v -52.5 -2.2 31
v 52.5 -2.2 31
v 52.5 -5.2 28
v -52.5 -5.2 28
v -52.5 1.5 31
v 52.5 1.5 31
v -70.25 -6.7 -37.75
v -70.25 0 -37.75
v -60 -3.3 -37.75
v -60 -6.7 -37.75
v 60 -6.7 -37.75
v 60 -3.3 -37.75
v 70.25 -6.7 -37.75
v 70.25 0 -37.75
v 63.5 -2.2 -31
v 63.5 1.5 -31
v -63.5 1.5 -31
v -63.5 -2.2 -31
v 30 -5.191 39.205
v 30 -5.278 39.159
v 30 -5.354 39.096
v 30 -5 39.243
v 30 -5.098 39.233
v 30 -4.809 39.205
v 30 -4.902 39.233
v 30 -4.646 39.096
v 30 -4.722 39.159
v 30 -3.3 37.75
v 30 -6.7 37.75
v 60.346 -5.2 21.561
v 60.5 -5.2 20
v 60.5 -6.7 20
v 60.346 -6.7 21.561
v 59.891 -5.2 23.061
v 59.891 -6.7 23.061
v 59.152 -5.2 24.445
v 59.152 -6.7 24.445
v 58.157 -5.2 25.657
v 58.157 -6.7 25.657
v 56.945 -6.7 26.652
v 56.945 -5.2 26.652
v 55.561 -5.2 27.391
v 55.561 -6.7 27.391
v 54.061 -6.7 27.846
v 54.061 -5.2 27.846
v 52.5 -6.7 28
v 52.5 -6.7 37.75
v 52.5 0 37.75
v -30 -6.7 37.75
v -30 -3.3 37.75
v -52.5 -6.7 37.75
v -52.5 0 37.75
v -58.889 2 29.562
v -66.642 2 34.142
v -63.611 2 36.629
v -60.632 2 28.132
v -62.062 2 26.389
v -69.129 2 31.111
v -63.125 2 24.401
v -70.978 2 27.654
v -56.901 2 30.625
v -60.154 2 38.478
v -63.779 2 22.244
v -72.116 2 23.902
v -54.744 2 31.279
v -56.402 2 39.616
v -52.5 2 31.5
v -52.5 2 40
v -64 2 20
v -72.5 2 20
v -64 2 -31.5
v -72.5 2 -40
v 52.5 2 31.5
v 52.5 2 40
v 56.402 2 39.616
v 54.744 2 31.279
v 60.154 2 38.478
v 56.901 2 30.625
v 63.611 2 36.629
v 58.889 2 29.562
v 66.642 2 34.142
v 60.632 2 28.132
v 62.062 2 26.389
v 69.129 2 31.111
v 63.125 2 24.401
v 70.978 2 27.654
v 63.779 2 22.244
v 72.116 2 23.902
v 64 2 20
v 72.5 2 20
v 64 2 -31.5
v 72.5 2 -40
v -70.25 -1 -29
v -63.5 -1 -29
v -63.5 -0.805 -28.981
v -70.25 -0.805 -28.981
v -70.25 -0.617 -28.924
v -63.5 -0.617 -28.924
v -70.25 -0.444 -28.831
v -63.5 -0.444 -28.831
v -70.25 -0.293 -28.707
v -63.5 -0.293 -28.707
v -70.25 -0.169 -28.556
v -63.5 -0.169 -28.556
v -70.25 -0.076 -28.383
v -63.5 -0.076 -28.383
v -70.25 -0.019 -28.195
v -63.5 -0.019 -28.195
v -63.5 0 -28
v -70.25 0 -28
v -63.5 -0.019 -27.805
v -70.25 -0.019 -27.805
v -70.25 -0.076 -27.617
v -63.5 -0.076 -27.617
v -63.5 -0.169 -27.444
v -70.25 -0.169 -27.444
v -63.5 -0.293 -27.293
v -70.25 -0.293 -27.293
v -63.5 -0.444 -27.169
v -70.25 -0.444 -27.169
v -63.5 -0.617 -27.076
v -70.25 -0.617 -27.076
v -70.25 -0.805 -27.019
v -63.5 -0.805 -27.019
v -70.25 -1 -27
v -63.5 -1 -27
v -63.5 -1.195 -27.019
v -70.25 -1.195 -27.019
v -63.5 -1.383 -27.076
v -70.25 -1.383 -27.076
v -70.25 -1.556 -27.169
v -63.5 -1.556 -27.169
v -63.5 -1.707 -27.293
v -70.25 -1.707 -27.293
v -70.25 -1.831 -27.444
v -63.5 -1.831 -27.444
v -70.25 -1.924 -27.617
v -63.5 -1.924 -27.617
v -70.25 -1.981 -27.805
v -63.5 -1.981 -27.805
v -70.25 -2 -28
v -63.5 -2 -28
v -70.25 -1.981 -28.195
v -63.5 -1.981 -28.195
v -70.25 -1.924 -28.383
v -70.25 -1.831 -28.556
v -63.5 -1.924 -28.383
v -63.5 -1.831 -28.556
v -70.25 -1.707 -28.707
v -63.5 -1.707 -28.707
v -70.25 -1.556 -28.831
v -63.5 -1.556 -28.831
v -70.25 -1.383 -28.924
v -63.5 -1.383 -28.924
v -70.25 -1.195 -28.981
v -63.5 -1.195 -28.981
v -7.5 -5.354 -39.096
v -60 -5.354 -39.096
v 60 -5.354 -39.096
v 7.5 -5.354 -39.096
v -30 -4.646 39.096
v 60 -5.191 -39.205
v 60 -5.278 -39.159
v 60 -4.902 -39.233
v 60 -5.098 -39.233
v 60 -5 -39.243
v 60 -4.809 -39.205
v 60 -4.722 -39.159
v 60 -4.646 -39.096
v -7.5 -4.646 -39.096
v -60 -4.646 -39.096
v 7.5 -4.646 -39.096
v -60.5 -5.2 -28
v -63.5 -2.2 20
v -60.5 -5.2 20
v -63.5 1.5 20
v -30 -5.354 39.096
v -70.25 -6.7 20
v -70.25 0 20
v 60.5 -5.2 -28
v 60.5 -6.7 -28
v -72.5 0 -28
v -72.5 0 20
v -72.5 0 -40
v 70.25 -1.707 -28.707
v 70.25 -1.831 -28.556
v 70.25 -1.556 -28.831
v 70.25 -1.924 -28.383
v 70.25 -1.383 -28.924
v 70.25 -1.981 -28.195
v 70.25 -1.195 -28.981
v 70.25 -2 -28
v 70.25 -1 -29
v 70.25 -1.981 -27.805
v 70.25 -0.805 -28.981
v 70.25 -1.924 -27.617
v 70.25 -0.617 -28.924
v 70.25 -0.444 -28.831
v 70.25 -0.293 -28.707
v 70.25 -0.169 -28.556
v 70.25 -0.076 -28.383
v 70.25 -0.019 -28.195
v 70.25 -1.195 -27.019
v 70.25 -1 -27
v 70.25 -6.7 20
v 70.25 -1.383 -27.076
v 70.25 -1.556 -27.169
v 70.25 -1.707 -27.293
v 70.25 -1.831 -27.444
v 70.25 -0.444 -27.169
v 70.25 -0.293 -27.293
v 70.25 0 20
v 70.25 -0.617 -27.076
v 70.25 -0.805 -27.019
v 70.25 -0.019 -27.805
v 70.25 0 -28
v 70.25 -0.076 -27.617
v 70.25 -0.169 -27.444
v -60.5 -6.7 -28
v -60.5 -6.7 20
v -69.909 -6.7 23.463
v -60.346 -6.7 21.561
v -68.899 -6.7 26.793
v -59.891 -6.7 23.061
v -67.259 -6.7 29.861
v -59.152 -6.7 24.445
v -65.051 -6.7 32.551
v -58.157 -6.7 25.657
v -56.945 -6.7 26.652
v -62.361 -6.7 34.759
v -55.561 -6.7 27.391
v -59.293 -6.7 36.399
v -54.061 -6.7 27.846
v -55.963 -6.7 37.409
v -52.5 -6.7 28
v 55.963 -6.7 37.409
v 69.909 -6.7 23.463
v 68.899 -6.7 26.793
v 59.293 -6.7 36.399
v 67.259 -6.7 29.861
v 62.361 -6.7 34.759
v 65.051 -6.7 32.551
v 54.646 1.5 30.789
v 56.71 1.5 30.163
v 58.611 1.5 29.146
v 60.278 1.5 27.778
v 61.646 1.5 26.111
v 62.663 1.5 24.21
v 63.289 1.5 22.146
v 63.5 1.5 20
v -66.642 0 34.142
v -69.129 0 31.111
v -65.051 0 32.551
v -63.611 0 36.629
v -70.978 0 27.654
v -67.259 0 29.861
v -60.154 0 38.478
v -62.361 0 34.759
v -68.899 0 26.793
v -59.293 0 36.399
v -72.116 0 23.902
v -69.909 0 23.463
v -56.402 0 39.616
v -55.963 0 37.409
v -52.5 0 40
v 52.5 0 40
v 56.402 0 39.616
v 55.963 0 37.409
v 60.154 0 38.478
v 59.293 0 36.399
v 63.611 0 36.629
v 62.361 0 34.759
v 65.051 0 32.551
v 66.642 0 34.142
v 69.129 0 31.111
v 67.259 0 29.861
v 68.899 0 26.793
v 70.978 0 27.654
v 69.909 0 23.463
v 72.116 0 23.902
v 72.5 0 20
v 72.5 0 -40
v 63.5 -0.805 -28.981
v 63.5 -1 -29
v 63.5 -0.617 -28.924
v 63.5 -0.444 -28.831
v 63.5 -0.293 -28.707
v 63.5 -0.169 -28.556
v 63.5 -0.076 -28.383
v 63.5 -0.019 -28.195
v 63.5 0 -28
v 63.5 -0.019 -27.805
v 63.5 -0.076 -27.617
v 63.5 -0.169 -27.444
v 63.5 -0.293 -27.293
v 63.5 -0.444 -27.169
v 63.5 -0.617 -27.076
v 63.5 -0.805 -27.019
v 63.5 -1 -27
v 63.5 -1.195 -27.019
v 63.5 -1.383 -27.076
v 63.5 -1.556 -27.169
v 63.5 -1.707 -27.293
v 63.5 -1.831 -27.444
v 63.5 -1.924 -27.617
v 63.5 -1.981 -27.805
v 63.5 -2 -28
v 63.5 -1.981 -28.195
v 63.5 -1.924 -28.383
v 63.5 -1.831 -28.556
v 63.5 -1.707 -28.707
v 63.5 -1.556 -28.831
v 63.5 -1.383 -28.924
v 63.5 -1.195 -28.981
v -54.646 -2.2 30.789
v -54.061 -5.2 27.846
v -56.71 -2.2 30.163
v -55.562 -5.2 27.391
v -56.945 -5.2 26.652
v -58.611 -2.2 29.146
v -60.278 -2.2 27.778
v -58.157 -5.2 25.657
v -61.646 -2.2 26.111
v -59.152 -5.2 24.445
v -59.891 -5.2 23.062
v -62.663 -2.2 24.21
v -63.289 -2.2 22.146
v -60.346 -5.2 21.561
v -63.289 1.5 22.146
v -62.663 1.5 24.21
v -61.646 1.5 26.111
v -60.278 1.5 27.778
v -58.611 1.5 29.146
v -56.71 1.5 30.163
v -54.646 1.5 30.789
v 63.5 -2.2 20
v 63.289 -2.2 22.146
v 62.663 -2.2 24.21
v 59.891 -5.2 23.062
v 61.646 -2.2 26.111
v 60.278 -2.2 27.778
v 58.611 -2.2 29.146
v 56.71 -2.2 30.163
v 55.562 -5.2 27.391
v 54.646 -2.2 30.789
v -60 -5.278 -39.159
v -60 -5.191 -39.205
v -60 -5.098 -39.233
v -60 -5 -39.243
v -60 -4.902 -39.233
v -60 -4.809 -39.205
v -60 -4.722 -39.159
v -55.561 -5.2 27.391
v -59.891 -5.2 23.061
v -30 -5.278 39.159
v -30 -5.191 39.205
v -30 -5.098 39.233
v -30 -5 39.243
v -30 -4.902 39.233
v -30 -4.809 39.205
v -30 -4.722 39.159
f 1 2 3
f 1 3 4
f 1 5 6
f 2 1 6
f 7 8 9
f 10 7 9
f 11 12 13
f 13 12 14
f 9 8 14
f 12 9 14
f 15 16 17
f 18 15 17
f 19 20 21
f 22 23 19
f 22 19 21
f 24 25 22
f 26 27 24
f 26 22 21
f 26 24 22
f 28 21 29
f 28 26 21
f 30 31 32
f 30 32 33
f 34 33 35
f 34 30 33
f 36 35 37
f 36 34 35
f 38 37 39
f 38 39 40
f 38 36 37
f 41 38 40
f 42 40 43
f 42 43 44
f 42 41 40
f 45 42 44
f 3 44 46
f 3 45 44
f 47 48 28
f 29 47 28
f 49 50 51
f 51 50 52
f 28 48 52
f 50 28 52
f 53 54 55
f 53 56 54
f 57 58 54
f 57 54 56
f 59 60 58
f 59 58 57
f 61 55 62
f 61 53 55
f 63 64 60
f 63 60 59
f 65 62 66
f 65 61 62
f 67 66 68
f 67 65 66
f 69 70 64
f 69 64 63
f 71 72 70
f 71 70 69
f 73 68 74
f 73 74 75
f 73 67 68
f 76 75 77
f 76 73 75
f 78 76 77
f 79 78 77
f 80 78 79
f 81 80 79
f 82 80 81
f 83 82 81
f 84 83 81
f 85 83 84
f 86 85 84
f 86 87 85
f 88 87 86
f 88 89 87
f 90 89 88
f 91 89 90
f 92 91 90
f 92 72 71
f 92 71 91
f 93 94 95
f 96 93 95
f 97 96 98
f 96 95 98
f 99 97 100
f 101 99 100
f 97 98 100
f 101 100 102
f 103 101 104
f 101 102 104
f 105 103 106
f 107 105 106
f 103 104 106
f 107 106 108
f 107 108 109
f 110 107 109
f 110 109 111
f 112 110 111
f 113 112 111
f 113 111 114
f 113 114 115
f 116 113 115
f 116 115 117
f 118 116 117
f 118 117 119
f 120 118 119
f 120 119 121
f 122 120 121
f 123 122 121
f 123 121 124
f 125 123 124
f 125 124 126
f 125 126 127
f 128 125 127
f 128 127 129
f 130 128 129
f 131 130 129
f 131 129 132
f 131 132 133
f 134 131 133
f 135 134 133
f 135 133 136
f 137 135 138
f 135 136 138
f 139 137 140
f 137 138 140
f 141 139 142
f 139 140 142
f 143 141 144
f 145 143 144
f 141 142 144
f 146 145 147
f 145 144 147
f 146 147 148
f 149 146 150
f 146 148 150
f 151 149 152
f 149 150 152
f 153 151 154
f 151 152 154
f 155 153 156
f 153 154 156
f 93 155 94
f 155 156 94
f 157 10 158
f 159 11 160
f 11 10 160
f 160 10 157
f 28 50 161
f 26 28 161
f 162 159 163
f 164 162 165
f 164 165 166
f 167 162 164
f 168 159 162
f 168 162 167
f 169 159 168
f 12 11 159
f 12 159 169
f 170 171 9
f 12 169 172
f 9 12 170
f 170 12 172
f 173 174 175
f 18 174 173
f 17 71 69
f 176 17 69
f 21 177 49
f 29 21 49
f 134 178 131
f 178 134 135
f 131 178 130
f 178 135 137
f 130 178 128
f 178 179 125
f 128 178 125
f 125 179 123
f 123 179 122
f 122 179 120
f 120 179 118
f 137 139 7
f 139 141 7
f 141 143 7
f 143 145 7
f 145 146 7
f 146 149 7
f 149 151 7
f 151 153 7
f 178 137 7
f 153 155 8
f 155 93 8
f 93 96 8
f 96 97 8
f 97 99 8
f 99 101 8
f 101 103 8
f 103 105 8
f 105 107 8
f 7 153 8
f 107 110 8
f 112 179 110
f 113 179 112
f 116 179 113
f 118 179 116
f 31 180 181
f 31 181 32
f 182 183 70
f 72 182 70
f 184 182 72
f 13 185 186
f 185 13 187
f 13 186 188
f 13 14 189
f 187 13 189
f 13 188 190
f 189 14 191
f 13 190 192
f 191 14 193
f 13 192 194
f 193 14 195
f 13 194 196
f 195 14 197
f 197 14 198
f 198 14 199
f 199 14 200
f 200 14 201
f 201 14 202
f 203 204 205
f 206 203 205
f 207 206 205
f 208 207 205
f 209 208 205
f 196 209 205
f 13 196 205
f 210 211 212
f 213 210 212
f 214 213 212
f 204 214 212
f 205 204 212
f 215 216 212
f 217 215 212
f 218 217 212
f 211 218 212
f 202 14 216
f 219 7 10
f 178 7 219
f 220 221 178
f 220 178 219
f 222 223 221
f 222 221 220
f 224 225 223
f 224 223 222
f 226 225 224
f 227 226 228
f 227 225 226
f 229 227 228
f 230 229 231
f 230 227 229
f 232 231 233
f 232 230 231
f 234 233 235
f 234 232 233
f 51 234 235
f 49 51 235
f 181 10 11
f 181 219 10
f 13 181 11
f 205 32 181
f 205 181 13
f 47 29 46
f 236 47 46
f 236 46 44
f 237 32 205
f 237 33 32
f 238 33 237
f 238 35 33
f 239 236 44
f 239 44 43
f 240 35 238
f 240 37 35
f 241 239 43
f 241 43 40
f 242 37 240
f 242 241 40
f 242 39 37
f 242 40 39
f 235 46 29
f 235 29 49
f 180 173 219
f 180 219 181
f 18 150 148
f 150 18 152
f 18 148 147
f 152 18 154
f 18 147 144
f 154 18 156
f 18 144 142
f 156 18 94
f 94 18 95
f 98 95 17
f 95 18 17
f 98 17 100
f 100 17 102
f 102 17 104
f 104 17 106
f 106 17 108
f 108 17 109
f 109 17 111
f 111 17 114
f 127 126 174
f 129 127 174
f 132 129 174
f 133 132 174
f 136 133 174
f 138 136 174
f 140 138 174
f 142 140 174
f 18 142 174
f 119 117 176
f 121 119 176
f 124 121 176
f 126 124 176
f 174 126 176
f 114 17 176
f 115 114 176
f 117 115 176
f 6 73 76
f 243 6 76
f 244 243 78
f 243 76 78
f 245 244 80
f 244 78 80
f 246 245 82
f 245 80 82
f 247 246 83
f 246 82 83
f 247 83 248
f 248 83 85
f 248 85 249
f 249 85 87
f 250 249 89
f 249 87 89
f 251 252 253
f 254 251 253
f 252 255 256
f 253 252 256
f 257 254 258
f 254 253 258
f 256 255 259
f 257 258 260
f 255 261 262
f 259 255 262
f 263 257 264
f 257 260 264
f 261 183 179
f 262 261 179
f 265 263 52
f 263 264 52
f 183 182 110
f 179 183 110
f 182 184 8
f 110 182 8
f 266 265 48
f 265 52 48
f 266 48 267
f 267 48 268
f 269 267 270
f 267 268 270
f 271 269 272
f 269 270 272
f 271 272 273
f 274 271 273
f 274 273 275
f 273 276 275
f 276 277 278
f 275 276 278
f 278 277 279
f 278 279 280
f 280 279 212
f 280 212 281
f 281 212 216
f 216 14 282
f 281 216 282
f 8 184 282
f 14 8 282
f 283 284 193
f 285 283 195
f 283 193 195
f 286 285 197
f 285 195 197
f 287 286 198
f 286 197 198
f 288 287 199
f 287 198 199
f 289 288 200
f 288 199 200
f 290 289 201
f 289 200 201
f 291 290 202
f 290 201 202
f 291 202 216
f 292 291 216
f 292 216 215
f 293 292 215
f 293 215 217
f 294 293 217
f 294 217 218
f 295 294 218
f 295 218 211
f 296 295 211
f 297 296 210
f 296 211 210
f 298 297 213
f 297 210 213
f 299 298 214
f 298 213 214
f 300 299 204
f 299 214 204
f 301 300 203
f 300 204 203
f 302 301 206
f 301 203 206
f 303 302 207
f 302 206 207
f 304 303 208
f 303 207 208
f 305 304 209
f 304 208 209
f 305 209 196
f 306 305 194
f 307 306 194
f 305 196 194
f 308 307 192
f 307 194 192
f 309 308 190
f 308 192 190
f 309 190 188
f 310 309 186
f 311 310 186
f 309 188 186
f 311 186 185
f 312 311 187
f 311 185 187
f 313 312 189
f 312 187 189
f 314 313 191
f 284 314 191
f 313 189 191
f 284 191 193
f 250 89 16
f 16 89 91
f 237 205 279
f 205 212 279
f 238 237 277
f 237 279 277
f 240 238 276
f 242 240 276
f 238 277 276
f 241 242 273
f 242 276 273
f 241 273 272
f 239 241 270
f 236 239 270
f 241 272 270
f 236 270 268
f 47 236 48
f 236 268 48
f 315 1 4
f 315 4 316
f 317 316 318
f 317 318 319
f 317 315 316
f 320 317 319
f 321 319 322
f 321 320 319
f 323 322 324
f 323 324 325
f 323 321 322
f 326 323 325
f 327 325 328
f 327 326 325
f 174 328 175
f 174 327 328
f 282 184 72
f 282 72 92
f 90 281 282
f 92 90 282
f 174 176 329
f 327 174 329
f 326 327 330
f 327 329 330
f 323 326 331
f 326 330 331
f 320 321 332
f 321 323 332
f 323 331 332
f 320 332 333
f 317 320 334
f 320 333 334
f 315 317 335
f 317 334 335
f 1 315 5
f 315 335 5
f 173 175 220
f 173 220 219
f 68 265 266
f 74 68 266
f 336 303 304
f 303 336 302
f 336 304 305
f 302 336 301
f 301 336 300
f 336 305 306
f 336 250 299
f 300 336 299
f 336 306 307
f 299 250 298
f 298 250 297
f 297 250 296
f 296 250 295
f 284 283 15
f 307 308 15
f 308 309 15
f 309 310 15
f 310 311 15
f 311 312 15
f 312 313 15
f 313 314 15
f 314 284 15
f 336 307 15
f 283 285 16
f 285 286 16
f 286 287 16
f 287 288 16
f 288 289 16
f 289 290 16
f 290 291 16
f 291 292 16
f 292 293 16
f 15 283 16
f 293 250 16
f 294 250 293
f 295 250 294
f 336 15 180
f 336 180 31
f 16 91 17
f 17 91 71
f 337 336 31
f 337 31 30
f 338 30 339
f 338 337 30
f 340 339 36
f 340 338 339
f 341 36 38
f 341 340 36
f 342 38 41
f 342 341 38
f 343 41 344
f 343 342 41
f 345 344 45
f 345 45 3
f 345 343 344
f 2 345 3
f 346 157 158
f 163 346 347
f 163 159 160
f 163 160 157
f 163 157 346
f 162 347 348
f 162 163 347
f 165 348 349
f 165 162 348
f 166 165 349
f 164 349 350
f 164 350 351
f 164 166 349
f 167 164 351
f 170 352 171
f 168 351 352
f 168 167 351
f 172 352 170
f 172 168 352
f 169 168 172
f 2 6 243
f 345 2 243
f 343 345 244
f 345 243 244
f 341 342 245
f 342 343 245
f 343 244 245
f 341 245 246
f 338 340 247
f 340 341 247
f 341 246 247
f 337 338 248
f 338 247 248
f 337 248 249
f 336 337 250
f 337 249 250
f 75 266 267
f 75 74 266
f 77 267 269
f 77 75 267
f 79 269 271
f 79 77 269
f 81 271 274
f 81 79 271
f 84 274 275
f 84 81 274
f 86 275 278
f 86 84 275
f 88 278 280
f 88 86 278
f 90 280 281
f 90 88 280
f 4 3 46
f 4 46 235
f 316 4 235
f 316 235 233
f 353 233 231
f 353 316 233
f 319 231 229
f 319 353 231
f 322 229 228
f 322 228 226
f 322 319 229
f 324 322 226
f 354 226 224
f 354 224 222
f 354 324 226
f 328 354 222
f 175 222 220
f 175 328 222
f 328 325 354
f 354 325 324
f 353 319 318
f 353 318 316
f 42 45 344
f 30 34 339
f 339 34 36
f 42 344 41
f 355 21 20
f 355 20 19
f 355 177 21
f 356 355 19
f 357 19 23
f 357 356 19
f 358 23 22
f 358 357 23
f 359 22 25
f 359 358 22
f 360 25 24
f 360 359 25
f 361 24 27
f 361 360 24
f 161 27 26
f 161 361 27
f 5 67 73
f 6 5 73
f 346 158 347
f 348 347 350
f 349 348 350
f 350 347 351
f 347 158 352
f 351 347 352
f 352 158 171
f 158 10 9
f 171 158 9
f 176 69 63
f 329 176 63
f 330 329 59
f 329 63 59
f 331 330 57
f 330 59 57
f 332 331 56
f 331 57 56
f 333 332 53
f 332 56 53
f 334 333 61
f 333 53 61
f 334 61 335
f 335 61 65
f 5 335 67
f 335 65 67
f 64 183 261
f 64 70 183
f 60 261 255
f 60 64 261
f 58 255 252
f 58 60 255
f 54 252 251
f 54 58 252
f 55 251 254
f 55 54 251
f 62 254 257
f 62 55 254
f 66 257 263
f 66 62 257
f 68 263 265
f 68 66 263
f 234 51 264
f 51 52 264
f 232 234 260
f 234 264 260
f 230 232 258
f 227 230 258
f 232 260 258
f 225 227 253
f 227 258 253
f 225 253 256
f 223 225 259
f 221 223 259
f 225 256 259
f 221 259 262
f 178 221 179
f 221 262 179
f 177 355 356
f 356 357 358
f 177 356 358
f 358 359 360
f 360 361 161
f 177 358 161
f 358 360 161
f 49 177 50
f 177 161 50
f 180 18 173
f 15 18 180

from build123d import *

# Parameters (mm, degrees)
SKETCH_1_W          = 145
SKETCH_1_H          = 80
EXTRUDE_1_DEPTH     = 2
FILLET_1_R          = 20
CUT_EXTRUDE_1_DEPTH = 2
EXTRUDE_2_DEPTH     = 2
EXTRUDE_4_DEPTH     = 7.5
EXTRUDE_5_DEPTH     = 30
FILLET_2_R          = 0.5
EXTRUDE_6_DEPTH     = 4.7
EXTRUDE_START       = -1.5
EXTRUDE_9_DEPTH     = 1.5
CHAMFER_2_SIZE      = 3
SKETCH_11_R         = 1
CUT_EXTRUDE_2_DEPTH = 149.399637803
CHAMFER_3_SIZE      = 0.5
EXTRUDE_10_DEPTH    = 60


with BuildPart() as part:
    # Эскиз1 → Бобышка-Вытянуть1 (new body)
    with BuildSketch(Plane(origin=(0, 0, 0), x_dir=(1, 0, 0), z_dir=(0, 1, 0))):
        Rectangle(SKETCH_1_W, SKETCH_1_H)
    extrude(amount=EXTRUDE_1_DEPTH)

    # Скругление1
    fillet_1_edges = [part.edges().sort_by_distance(p)[0] for p in [
        (72.5, 1, 40),
        (-72.5, 1, 40),
    ]]
    fillet(fillet_1_edges, radius=FILLET_1_R)

    # Эскиз2 → Вырез-Вытянуть1 (cut)
    with BuildSketch(Plane(origin=(0, 2, 0), x_dir=(1, 0, 0), z_dir=(0, 1, 0))):
        with BuildLine():
            Line((-63.5, 31), (-63.5, -20))
            ThreePointArc((-63.5, -20), (-60.278174593, -27.778174593), (-52.5, -31))
            Line((-52.5, -31), (52.5, -31))
            ThreePointArc((52.5, -31), (60.278174593, -27.778174593), (63.5, -20))
            Line((63.5, -20), (63.5, 31))
            Line((63.5, 31), (-63.5, 31))
        make_face()
    extrude(amount=-CUT_EXTRUDE_1_DEPTH, mode=Mode.SUBTRACT)

    # Эскиз3 → Бобышка-Вытянуть2 (add)
    with BuildSketch(Plane.XZ):
        with BuildLine():
            Line((70.25, -37.75), (70.25, 20))
            ThreePointArc((70.25, 20), (65.051145366, 32.551145366), (52.5, 37.75))
            Line((52.5, 37.75), (-52.5, 37.75))
            ThreePointArc((-52.5, 37.75), (-65.051145366, 32.551145366), (-70.25, 20))
            Line((-70.25, 20), (-70.25, -37.75))
            Line((-70.25, -37.75), (70.25, -37.75))
        make_face()
        with BuildLine():
            Line((-63.5, -31), (-63.5, 20))
            ThreePointArc((-63.5, 20), (-60.278174593, 27.778174593), (-52.5, 31))
            Line((-52.5, 31), (52.5, 31))
            ThreePointArc((52.5, 31), (60.278174593, 27.778174593), (63.5, 20))
            Line((63.5, 20), (63.5, -31))
            Line((63.5, -31), (-63.5, -31))
        make_face(mode=Mode.SUBTRACT)
    extrude(amount=EXTRUDE_2_DEPTH)

    # Эскиз5 → Бобышка-Вытянуть4 (add, symmetric)
    with BuildSketch(Plane(origin=(0, 0, 0), x_dir=(0, 0, -1), z_dir=(1, 0, 0))):
        Polygon((37.75, -2), (31, -2), (31, -6.7), (37.75, -6.7), (39.45, -5), (37.75, -3.3), align=None)
        Polygon((-31, -2), (-31, -6.7), (-37.75, -6.7), (-39.45, -5), (-37.75, -3.3), (-37.75, -2), align=None)
    extrude(amount=EXTRUDE_4_DEPTH, both=True)

    # Эскиз6 → Бобышка-Вытянуть5 (add, symmetric)
    with BuildSketch(Plane(origin=(0, 0, 0), x_dir=(0, 0, -1), z_dir=(1, 0, 0))):
        Polygon((-39.45, -5), (-37.75, -6.7), (-31, -6.7), (-31, -2), (-37.75, -2), (-37.75, -3.3), align=None)
    extrude(amount=EXTRUDE_5_DEPTH, both=True)

    # Скругление2
    fillet_2_edges = [part.edges().sort_by_distance(p)[0] for p in [
        (0, -5, 39.45),
        (0, -5, -39.45),
    ]]
    fillet(fillet_2_edges, radius=FILLET_2_R)

    # Эскиз7 → Бобышка-Вытянуть6 (add)
    with BuildSketch(Plane.XZ.offset(2)):
        with BuildLine():
            Line((-52.5, 31), (-30, 31))
            Line((-30, 31), (-30, 37.75))
            Line((-30, 37.75), (-52.5, 37.75))
            ThreePointArc((-52.5, 37.75), (-65.051145366, 32.551145366), (-70.25, 20))
            Line((-70.25, 20), (-70.25, -37.75))
            Line((-70.25, -37.75), (-7.5, -37.75))
            Line((-7.5, -37.75), (-7.5, -31))
            Line((-7.5, -31), (-63.5, -31))
            Line((-63.5, -31), (-63.5, 20))
            ThreePointArc((-63.5, 20), (-60.278174593, 27.778174593), (-52.5, 31))
        make_face()
        with BuildLine():
            Line((30, 31), (52.5, 31))
            ThreePointArc((52.5, 31), (60.278174593, 27.778174593), (63.5, 20))
            Line((63.5, 20), (63.5, -31))
            Line((63.5, -31), (7.5, -31))
            Line((7.5, -31), (7.5, -37.75))
            Line((7.5, -37.75), (70.25, -37.75))
            Line((70.25, -37.75), (70.25, 20))
            ThreePointArc((70.25, 20), (65.051145366, 32.551145366), (52.5, 37.75))
            Line((52.5, 37.75), (30, 37.75))
            Line((30, 37.75), (30, 31))
        make_face()
    extrude(amount=EXTRUDE_6_DEPTH)

    # Эскиз10 → Бобышка-Вытянуть9 (add)
    with BuildSketch(Plane.XZ.offset(6.7).offset(EXTRUDE_START)):
        with BuildLine():
            Line((-63.5, 20), (-63.5, -31))
            Line((-63.5, -31), (63.5, -31))
            Line((63.5, -31), (63.5, 20))
            ThreePointArc((63.5, 20), (60.278174593, 27.778174593), (52.5, 31))
            Line((52.5, 31), (-52.5, 31))
            ThreePointArc((-52.5, 31), (-60.278174593, 27.778174593), (-63.5, 20))
        make_face()
        with BuildLine():
            Line((60.5, -28), (60.5, 20))
            ThreePointArc((60.5, 20), (58.156854249, 25.656854249), (52.5, 28))
            Line((52.5, 28), (-52.5, 28))
            ThreePointArc((-52.5, 28), (-58.156854249, 25.656854249), (-60.5, 20))
            Line((-60.5, 20), (-60.5, -28))
            Line((-60.5, -28), (60.5, -28))
        make_face(mode=Mode.SUBTRACT)
    extrude(amount=EXTRUDE_9_DEPTH)

    # Фаска2
    chamfer_2_edges = [part.edges().sort_by_distance(p)[0] for p in [
        (-60.278174593, -5.2, 27.778174593),
        (0, -5.2, 31),
        (60.278174593, -5.2, 27.778174593),
        (63.5, -5.2, -5.5),
        (0, -5.2, -31),
        (-63.5, -5.2, -5.5),
    ]]
    chamfer(chamfer_2_edges, length=CHAMFER_2_SIZE - 0.0001)  # a hair under: the kernel refuses the full size

    # Эскиз11 → Вырез-Вытянуть2 (cut, through all)
    with BuildSketch(Plane(origin=(70.25, 0, 0), x_dir=(0, 0, -1), z_dir=(1, 0, 0))):
        with Locations((28, -1)):
            Circle(SKETCH_11_R)
    extrude(amount=-CUT_EXTRUDE_2_DEPTH, mode=Mode.SUBTRACT)

    # Фаска3
    chamfer_3_edges = [part.edges().sort_by_distance(p)[0] for p in [
        (0, 2, -31),
        (-63.5, 2, -5.5),
        (-60.278174593, 2, 27.778174593),
        (0, 2, 31),
        (60.278174593, 2, 27.778174593),
        (63.5, 2, -5.5),
    ]]
    chamfer(chamfer_3_edges, length=CHAMFER_3_SIZE)

    # Эскиз12 → Бобышка-Вытянуть10 (add, symmetric)
    with BuildSketch(Plane(origin=(0, 0, 0), x_dir=(0, 0, -1), z_dir=(1, 0, 0))):
        with BuildLine():
            Line((39.096446609, -4.646446609), (37.75, -3.3))
            Line((37.75, -3.3), (37.75, -6.7))
            Line((37.75, -6.7), (39.096446609, -5.353553391))
            ThreePointArc((39.096446609, -5.353553391), (39.242893219, -5), (39.096446609, -4.646446609))
        make_face()
    extrude(amount=EXTRUDE_10_DEPTH, both=True)


solid = part.part
